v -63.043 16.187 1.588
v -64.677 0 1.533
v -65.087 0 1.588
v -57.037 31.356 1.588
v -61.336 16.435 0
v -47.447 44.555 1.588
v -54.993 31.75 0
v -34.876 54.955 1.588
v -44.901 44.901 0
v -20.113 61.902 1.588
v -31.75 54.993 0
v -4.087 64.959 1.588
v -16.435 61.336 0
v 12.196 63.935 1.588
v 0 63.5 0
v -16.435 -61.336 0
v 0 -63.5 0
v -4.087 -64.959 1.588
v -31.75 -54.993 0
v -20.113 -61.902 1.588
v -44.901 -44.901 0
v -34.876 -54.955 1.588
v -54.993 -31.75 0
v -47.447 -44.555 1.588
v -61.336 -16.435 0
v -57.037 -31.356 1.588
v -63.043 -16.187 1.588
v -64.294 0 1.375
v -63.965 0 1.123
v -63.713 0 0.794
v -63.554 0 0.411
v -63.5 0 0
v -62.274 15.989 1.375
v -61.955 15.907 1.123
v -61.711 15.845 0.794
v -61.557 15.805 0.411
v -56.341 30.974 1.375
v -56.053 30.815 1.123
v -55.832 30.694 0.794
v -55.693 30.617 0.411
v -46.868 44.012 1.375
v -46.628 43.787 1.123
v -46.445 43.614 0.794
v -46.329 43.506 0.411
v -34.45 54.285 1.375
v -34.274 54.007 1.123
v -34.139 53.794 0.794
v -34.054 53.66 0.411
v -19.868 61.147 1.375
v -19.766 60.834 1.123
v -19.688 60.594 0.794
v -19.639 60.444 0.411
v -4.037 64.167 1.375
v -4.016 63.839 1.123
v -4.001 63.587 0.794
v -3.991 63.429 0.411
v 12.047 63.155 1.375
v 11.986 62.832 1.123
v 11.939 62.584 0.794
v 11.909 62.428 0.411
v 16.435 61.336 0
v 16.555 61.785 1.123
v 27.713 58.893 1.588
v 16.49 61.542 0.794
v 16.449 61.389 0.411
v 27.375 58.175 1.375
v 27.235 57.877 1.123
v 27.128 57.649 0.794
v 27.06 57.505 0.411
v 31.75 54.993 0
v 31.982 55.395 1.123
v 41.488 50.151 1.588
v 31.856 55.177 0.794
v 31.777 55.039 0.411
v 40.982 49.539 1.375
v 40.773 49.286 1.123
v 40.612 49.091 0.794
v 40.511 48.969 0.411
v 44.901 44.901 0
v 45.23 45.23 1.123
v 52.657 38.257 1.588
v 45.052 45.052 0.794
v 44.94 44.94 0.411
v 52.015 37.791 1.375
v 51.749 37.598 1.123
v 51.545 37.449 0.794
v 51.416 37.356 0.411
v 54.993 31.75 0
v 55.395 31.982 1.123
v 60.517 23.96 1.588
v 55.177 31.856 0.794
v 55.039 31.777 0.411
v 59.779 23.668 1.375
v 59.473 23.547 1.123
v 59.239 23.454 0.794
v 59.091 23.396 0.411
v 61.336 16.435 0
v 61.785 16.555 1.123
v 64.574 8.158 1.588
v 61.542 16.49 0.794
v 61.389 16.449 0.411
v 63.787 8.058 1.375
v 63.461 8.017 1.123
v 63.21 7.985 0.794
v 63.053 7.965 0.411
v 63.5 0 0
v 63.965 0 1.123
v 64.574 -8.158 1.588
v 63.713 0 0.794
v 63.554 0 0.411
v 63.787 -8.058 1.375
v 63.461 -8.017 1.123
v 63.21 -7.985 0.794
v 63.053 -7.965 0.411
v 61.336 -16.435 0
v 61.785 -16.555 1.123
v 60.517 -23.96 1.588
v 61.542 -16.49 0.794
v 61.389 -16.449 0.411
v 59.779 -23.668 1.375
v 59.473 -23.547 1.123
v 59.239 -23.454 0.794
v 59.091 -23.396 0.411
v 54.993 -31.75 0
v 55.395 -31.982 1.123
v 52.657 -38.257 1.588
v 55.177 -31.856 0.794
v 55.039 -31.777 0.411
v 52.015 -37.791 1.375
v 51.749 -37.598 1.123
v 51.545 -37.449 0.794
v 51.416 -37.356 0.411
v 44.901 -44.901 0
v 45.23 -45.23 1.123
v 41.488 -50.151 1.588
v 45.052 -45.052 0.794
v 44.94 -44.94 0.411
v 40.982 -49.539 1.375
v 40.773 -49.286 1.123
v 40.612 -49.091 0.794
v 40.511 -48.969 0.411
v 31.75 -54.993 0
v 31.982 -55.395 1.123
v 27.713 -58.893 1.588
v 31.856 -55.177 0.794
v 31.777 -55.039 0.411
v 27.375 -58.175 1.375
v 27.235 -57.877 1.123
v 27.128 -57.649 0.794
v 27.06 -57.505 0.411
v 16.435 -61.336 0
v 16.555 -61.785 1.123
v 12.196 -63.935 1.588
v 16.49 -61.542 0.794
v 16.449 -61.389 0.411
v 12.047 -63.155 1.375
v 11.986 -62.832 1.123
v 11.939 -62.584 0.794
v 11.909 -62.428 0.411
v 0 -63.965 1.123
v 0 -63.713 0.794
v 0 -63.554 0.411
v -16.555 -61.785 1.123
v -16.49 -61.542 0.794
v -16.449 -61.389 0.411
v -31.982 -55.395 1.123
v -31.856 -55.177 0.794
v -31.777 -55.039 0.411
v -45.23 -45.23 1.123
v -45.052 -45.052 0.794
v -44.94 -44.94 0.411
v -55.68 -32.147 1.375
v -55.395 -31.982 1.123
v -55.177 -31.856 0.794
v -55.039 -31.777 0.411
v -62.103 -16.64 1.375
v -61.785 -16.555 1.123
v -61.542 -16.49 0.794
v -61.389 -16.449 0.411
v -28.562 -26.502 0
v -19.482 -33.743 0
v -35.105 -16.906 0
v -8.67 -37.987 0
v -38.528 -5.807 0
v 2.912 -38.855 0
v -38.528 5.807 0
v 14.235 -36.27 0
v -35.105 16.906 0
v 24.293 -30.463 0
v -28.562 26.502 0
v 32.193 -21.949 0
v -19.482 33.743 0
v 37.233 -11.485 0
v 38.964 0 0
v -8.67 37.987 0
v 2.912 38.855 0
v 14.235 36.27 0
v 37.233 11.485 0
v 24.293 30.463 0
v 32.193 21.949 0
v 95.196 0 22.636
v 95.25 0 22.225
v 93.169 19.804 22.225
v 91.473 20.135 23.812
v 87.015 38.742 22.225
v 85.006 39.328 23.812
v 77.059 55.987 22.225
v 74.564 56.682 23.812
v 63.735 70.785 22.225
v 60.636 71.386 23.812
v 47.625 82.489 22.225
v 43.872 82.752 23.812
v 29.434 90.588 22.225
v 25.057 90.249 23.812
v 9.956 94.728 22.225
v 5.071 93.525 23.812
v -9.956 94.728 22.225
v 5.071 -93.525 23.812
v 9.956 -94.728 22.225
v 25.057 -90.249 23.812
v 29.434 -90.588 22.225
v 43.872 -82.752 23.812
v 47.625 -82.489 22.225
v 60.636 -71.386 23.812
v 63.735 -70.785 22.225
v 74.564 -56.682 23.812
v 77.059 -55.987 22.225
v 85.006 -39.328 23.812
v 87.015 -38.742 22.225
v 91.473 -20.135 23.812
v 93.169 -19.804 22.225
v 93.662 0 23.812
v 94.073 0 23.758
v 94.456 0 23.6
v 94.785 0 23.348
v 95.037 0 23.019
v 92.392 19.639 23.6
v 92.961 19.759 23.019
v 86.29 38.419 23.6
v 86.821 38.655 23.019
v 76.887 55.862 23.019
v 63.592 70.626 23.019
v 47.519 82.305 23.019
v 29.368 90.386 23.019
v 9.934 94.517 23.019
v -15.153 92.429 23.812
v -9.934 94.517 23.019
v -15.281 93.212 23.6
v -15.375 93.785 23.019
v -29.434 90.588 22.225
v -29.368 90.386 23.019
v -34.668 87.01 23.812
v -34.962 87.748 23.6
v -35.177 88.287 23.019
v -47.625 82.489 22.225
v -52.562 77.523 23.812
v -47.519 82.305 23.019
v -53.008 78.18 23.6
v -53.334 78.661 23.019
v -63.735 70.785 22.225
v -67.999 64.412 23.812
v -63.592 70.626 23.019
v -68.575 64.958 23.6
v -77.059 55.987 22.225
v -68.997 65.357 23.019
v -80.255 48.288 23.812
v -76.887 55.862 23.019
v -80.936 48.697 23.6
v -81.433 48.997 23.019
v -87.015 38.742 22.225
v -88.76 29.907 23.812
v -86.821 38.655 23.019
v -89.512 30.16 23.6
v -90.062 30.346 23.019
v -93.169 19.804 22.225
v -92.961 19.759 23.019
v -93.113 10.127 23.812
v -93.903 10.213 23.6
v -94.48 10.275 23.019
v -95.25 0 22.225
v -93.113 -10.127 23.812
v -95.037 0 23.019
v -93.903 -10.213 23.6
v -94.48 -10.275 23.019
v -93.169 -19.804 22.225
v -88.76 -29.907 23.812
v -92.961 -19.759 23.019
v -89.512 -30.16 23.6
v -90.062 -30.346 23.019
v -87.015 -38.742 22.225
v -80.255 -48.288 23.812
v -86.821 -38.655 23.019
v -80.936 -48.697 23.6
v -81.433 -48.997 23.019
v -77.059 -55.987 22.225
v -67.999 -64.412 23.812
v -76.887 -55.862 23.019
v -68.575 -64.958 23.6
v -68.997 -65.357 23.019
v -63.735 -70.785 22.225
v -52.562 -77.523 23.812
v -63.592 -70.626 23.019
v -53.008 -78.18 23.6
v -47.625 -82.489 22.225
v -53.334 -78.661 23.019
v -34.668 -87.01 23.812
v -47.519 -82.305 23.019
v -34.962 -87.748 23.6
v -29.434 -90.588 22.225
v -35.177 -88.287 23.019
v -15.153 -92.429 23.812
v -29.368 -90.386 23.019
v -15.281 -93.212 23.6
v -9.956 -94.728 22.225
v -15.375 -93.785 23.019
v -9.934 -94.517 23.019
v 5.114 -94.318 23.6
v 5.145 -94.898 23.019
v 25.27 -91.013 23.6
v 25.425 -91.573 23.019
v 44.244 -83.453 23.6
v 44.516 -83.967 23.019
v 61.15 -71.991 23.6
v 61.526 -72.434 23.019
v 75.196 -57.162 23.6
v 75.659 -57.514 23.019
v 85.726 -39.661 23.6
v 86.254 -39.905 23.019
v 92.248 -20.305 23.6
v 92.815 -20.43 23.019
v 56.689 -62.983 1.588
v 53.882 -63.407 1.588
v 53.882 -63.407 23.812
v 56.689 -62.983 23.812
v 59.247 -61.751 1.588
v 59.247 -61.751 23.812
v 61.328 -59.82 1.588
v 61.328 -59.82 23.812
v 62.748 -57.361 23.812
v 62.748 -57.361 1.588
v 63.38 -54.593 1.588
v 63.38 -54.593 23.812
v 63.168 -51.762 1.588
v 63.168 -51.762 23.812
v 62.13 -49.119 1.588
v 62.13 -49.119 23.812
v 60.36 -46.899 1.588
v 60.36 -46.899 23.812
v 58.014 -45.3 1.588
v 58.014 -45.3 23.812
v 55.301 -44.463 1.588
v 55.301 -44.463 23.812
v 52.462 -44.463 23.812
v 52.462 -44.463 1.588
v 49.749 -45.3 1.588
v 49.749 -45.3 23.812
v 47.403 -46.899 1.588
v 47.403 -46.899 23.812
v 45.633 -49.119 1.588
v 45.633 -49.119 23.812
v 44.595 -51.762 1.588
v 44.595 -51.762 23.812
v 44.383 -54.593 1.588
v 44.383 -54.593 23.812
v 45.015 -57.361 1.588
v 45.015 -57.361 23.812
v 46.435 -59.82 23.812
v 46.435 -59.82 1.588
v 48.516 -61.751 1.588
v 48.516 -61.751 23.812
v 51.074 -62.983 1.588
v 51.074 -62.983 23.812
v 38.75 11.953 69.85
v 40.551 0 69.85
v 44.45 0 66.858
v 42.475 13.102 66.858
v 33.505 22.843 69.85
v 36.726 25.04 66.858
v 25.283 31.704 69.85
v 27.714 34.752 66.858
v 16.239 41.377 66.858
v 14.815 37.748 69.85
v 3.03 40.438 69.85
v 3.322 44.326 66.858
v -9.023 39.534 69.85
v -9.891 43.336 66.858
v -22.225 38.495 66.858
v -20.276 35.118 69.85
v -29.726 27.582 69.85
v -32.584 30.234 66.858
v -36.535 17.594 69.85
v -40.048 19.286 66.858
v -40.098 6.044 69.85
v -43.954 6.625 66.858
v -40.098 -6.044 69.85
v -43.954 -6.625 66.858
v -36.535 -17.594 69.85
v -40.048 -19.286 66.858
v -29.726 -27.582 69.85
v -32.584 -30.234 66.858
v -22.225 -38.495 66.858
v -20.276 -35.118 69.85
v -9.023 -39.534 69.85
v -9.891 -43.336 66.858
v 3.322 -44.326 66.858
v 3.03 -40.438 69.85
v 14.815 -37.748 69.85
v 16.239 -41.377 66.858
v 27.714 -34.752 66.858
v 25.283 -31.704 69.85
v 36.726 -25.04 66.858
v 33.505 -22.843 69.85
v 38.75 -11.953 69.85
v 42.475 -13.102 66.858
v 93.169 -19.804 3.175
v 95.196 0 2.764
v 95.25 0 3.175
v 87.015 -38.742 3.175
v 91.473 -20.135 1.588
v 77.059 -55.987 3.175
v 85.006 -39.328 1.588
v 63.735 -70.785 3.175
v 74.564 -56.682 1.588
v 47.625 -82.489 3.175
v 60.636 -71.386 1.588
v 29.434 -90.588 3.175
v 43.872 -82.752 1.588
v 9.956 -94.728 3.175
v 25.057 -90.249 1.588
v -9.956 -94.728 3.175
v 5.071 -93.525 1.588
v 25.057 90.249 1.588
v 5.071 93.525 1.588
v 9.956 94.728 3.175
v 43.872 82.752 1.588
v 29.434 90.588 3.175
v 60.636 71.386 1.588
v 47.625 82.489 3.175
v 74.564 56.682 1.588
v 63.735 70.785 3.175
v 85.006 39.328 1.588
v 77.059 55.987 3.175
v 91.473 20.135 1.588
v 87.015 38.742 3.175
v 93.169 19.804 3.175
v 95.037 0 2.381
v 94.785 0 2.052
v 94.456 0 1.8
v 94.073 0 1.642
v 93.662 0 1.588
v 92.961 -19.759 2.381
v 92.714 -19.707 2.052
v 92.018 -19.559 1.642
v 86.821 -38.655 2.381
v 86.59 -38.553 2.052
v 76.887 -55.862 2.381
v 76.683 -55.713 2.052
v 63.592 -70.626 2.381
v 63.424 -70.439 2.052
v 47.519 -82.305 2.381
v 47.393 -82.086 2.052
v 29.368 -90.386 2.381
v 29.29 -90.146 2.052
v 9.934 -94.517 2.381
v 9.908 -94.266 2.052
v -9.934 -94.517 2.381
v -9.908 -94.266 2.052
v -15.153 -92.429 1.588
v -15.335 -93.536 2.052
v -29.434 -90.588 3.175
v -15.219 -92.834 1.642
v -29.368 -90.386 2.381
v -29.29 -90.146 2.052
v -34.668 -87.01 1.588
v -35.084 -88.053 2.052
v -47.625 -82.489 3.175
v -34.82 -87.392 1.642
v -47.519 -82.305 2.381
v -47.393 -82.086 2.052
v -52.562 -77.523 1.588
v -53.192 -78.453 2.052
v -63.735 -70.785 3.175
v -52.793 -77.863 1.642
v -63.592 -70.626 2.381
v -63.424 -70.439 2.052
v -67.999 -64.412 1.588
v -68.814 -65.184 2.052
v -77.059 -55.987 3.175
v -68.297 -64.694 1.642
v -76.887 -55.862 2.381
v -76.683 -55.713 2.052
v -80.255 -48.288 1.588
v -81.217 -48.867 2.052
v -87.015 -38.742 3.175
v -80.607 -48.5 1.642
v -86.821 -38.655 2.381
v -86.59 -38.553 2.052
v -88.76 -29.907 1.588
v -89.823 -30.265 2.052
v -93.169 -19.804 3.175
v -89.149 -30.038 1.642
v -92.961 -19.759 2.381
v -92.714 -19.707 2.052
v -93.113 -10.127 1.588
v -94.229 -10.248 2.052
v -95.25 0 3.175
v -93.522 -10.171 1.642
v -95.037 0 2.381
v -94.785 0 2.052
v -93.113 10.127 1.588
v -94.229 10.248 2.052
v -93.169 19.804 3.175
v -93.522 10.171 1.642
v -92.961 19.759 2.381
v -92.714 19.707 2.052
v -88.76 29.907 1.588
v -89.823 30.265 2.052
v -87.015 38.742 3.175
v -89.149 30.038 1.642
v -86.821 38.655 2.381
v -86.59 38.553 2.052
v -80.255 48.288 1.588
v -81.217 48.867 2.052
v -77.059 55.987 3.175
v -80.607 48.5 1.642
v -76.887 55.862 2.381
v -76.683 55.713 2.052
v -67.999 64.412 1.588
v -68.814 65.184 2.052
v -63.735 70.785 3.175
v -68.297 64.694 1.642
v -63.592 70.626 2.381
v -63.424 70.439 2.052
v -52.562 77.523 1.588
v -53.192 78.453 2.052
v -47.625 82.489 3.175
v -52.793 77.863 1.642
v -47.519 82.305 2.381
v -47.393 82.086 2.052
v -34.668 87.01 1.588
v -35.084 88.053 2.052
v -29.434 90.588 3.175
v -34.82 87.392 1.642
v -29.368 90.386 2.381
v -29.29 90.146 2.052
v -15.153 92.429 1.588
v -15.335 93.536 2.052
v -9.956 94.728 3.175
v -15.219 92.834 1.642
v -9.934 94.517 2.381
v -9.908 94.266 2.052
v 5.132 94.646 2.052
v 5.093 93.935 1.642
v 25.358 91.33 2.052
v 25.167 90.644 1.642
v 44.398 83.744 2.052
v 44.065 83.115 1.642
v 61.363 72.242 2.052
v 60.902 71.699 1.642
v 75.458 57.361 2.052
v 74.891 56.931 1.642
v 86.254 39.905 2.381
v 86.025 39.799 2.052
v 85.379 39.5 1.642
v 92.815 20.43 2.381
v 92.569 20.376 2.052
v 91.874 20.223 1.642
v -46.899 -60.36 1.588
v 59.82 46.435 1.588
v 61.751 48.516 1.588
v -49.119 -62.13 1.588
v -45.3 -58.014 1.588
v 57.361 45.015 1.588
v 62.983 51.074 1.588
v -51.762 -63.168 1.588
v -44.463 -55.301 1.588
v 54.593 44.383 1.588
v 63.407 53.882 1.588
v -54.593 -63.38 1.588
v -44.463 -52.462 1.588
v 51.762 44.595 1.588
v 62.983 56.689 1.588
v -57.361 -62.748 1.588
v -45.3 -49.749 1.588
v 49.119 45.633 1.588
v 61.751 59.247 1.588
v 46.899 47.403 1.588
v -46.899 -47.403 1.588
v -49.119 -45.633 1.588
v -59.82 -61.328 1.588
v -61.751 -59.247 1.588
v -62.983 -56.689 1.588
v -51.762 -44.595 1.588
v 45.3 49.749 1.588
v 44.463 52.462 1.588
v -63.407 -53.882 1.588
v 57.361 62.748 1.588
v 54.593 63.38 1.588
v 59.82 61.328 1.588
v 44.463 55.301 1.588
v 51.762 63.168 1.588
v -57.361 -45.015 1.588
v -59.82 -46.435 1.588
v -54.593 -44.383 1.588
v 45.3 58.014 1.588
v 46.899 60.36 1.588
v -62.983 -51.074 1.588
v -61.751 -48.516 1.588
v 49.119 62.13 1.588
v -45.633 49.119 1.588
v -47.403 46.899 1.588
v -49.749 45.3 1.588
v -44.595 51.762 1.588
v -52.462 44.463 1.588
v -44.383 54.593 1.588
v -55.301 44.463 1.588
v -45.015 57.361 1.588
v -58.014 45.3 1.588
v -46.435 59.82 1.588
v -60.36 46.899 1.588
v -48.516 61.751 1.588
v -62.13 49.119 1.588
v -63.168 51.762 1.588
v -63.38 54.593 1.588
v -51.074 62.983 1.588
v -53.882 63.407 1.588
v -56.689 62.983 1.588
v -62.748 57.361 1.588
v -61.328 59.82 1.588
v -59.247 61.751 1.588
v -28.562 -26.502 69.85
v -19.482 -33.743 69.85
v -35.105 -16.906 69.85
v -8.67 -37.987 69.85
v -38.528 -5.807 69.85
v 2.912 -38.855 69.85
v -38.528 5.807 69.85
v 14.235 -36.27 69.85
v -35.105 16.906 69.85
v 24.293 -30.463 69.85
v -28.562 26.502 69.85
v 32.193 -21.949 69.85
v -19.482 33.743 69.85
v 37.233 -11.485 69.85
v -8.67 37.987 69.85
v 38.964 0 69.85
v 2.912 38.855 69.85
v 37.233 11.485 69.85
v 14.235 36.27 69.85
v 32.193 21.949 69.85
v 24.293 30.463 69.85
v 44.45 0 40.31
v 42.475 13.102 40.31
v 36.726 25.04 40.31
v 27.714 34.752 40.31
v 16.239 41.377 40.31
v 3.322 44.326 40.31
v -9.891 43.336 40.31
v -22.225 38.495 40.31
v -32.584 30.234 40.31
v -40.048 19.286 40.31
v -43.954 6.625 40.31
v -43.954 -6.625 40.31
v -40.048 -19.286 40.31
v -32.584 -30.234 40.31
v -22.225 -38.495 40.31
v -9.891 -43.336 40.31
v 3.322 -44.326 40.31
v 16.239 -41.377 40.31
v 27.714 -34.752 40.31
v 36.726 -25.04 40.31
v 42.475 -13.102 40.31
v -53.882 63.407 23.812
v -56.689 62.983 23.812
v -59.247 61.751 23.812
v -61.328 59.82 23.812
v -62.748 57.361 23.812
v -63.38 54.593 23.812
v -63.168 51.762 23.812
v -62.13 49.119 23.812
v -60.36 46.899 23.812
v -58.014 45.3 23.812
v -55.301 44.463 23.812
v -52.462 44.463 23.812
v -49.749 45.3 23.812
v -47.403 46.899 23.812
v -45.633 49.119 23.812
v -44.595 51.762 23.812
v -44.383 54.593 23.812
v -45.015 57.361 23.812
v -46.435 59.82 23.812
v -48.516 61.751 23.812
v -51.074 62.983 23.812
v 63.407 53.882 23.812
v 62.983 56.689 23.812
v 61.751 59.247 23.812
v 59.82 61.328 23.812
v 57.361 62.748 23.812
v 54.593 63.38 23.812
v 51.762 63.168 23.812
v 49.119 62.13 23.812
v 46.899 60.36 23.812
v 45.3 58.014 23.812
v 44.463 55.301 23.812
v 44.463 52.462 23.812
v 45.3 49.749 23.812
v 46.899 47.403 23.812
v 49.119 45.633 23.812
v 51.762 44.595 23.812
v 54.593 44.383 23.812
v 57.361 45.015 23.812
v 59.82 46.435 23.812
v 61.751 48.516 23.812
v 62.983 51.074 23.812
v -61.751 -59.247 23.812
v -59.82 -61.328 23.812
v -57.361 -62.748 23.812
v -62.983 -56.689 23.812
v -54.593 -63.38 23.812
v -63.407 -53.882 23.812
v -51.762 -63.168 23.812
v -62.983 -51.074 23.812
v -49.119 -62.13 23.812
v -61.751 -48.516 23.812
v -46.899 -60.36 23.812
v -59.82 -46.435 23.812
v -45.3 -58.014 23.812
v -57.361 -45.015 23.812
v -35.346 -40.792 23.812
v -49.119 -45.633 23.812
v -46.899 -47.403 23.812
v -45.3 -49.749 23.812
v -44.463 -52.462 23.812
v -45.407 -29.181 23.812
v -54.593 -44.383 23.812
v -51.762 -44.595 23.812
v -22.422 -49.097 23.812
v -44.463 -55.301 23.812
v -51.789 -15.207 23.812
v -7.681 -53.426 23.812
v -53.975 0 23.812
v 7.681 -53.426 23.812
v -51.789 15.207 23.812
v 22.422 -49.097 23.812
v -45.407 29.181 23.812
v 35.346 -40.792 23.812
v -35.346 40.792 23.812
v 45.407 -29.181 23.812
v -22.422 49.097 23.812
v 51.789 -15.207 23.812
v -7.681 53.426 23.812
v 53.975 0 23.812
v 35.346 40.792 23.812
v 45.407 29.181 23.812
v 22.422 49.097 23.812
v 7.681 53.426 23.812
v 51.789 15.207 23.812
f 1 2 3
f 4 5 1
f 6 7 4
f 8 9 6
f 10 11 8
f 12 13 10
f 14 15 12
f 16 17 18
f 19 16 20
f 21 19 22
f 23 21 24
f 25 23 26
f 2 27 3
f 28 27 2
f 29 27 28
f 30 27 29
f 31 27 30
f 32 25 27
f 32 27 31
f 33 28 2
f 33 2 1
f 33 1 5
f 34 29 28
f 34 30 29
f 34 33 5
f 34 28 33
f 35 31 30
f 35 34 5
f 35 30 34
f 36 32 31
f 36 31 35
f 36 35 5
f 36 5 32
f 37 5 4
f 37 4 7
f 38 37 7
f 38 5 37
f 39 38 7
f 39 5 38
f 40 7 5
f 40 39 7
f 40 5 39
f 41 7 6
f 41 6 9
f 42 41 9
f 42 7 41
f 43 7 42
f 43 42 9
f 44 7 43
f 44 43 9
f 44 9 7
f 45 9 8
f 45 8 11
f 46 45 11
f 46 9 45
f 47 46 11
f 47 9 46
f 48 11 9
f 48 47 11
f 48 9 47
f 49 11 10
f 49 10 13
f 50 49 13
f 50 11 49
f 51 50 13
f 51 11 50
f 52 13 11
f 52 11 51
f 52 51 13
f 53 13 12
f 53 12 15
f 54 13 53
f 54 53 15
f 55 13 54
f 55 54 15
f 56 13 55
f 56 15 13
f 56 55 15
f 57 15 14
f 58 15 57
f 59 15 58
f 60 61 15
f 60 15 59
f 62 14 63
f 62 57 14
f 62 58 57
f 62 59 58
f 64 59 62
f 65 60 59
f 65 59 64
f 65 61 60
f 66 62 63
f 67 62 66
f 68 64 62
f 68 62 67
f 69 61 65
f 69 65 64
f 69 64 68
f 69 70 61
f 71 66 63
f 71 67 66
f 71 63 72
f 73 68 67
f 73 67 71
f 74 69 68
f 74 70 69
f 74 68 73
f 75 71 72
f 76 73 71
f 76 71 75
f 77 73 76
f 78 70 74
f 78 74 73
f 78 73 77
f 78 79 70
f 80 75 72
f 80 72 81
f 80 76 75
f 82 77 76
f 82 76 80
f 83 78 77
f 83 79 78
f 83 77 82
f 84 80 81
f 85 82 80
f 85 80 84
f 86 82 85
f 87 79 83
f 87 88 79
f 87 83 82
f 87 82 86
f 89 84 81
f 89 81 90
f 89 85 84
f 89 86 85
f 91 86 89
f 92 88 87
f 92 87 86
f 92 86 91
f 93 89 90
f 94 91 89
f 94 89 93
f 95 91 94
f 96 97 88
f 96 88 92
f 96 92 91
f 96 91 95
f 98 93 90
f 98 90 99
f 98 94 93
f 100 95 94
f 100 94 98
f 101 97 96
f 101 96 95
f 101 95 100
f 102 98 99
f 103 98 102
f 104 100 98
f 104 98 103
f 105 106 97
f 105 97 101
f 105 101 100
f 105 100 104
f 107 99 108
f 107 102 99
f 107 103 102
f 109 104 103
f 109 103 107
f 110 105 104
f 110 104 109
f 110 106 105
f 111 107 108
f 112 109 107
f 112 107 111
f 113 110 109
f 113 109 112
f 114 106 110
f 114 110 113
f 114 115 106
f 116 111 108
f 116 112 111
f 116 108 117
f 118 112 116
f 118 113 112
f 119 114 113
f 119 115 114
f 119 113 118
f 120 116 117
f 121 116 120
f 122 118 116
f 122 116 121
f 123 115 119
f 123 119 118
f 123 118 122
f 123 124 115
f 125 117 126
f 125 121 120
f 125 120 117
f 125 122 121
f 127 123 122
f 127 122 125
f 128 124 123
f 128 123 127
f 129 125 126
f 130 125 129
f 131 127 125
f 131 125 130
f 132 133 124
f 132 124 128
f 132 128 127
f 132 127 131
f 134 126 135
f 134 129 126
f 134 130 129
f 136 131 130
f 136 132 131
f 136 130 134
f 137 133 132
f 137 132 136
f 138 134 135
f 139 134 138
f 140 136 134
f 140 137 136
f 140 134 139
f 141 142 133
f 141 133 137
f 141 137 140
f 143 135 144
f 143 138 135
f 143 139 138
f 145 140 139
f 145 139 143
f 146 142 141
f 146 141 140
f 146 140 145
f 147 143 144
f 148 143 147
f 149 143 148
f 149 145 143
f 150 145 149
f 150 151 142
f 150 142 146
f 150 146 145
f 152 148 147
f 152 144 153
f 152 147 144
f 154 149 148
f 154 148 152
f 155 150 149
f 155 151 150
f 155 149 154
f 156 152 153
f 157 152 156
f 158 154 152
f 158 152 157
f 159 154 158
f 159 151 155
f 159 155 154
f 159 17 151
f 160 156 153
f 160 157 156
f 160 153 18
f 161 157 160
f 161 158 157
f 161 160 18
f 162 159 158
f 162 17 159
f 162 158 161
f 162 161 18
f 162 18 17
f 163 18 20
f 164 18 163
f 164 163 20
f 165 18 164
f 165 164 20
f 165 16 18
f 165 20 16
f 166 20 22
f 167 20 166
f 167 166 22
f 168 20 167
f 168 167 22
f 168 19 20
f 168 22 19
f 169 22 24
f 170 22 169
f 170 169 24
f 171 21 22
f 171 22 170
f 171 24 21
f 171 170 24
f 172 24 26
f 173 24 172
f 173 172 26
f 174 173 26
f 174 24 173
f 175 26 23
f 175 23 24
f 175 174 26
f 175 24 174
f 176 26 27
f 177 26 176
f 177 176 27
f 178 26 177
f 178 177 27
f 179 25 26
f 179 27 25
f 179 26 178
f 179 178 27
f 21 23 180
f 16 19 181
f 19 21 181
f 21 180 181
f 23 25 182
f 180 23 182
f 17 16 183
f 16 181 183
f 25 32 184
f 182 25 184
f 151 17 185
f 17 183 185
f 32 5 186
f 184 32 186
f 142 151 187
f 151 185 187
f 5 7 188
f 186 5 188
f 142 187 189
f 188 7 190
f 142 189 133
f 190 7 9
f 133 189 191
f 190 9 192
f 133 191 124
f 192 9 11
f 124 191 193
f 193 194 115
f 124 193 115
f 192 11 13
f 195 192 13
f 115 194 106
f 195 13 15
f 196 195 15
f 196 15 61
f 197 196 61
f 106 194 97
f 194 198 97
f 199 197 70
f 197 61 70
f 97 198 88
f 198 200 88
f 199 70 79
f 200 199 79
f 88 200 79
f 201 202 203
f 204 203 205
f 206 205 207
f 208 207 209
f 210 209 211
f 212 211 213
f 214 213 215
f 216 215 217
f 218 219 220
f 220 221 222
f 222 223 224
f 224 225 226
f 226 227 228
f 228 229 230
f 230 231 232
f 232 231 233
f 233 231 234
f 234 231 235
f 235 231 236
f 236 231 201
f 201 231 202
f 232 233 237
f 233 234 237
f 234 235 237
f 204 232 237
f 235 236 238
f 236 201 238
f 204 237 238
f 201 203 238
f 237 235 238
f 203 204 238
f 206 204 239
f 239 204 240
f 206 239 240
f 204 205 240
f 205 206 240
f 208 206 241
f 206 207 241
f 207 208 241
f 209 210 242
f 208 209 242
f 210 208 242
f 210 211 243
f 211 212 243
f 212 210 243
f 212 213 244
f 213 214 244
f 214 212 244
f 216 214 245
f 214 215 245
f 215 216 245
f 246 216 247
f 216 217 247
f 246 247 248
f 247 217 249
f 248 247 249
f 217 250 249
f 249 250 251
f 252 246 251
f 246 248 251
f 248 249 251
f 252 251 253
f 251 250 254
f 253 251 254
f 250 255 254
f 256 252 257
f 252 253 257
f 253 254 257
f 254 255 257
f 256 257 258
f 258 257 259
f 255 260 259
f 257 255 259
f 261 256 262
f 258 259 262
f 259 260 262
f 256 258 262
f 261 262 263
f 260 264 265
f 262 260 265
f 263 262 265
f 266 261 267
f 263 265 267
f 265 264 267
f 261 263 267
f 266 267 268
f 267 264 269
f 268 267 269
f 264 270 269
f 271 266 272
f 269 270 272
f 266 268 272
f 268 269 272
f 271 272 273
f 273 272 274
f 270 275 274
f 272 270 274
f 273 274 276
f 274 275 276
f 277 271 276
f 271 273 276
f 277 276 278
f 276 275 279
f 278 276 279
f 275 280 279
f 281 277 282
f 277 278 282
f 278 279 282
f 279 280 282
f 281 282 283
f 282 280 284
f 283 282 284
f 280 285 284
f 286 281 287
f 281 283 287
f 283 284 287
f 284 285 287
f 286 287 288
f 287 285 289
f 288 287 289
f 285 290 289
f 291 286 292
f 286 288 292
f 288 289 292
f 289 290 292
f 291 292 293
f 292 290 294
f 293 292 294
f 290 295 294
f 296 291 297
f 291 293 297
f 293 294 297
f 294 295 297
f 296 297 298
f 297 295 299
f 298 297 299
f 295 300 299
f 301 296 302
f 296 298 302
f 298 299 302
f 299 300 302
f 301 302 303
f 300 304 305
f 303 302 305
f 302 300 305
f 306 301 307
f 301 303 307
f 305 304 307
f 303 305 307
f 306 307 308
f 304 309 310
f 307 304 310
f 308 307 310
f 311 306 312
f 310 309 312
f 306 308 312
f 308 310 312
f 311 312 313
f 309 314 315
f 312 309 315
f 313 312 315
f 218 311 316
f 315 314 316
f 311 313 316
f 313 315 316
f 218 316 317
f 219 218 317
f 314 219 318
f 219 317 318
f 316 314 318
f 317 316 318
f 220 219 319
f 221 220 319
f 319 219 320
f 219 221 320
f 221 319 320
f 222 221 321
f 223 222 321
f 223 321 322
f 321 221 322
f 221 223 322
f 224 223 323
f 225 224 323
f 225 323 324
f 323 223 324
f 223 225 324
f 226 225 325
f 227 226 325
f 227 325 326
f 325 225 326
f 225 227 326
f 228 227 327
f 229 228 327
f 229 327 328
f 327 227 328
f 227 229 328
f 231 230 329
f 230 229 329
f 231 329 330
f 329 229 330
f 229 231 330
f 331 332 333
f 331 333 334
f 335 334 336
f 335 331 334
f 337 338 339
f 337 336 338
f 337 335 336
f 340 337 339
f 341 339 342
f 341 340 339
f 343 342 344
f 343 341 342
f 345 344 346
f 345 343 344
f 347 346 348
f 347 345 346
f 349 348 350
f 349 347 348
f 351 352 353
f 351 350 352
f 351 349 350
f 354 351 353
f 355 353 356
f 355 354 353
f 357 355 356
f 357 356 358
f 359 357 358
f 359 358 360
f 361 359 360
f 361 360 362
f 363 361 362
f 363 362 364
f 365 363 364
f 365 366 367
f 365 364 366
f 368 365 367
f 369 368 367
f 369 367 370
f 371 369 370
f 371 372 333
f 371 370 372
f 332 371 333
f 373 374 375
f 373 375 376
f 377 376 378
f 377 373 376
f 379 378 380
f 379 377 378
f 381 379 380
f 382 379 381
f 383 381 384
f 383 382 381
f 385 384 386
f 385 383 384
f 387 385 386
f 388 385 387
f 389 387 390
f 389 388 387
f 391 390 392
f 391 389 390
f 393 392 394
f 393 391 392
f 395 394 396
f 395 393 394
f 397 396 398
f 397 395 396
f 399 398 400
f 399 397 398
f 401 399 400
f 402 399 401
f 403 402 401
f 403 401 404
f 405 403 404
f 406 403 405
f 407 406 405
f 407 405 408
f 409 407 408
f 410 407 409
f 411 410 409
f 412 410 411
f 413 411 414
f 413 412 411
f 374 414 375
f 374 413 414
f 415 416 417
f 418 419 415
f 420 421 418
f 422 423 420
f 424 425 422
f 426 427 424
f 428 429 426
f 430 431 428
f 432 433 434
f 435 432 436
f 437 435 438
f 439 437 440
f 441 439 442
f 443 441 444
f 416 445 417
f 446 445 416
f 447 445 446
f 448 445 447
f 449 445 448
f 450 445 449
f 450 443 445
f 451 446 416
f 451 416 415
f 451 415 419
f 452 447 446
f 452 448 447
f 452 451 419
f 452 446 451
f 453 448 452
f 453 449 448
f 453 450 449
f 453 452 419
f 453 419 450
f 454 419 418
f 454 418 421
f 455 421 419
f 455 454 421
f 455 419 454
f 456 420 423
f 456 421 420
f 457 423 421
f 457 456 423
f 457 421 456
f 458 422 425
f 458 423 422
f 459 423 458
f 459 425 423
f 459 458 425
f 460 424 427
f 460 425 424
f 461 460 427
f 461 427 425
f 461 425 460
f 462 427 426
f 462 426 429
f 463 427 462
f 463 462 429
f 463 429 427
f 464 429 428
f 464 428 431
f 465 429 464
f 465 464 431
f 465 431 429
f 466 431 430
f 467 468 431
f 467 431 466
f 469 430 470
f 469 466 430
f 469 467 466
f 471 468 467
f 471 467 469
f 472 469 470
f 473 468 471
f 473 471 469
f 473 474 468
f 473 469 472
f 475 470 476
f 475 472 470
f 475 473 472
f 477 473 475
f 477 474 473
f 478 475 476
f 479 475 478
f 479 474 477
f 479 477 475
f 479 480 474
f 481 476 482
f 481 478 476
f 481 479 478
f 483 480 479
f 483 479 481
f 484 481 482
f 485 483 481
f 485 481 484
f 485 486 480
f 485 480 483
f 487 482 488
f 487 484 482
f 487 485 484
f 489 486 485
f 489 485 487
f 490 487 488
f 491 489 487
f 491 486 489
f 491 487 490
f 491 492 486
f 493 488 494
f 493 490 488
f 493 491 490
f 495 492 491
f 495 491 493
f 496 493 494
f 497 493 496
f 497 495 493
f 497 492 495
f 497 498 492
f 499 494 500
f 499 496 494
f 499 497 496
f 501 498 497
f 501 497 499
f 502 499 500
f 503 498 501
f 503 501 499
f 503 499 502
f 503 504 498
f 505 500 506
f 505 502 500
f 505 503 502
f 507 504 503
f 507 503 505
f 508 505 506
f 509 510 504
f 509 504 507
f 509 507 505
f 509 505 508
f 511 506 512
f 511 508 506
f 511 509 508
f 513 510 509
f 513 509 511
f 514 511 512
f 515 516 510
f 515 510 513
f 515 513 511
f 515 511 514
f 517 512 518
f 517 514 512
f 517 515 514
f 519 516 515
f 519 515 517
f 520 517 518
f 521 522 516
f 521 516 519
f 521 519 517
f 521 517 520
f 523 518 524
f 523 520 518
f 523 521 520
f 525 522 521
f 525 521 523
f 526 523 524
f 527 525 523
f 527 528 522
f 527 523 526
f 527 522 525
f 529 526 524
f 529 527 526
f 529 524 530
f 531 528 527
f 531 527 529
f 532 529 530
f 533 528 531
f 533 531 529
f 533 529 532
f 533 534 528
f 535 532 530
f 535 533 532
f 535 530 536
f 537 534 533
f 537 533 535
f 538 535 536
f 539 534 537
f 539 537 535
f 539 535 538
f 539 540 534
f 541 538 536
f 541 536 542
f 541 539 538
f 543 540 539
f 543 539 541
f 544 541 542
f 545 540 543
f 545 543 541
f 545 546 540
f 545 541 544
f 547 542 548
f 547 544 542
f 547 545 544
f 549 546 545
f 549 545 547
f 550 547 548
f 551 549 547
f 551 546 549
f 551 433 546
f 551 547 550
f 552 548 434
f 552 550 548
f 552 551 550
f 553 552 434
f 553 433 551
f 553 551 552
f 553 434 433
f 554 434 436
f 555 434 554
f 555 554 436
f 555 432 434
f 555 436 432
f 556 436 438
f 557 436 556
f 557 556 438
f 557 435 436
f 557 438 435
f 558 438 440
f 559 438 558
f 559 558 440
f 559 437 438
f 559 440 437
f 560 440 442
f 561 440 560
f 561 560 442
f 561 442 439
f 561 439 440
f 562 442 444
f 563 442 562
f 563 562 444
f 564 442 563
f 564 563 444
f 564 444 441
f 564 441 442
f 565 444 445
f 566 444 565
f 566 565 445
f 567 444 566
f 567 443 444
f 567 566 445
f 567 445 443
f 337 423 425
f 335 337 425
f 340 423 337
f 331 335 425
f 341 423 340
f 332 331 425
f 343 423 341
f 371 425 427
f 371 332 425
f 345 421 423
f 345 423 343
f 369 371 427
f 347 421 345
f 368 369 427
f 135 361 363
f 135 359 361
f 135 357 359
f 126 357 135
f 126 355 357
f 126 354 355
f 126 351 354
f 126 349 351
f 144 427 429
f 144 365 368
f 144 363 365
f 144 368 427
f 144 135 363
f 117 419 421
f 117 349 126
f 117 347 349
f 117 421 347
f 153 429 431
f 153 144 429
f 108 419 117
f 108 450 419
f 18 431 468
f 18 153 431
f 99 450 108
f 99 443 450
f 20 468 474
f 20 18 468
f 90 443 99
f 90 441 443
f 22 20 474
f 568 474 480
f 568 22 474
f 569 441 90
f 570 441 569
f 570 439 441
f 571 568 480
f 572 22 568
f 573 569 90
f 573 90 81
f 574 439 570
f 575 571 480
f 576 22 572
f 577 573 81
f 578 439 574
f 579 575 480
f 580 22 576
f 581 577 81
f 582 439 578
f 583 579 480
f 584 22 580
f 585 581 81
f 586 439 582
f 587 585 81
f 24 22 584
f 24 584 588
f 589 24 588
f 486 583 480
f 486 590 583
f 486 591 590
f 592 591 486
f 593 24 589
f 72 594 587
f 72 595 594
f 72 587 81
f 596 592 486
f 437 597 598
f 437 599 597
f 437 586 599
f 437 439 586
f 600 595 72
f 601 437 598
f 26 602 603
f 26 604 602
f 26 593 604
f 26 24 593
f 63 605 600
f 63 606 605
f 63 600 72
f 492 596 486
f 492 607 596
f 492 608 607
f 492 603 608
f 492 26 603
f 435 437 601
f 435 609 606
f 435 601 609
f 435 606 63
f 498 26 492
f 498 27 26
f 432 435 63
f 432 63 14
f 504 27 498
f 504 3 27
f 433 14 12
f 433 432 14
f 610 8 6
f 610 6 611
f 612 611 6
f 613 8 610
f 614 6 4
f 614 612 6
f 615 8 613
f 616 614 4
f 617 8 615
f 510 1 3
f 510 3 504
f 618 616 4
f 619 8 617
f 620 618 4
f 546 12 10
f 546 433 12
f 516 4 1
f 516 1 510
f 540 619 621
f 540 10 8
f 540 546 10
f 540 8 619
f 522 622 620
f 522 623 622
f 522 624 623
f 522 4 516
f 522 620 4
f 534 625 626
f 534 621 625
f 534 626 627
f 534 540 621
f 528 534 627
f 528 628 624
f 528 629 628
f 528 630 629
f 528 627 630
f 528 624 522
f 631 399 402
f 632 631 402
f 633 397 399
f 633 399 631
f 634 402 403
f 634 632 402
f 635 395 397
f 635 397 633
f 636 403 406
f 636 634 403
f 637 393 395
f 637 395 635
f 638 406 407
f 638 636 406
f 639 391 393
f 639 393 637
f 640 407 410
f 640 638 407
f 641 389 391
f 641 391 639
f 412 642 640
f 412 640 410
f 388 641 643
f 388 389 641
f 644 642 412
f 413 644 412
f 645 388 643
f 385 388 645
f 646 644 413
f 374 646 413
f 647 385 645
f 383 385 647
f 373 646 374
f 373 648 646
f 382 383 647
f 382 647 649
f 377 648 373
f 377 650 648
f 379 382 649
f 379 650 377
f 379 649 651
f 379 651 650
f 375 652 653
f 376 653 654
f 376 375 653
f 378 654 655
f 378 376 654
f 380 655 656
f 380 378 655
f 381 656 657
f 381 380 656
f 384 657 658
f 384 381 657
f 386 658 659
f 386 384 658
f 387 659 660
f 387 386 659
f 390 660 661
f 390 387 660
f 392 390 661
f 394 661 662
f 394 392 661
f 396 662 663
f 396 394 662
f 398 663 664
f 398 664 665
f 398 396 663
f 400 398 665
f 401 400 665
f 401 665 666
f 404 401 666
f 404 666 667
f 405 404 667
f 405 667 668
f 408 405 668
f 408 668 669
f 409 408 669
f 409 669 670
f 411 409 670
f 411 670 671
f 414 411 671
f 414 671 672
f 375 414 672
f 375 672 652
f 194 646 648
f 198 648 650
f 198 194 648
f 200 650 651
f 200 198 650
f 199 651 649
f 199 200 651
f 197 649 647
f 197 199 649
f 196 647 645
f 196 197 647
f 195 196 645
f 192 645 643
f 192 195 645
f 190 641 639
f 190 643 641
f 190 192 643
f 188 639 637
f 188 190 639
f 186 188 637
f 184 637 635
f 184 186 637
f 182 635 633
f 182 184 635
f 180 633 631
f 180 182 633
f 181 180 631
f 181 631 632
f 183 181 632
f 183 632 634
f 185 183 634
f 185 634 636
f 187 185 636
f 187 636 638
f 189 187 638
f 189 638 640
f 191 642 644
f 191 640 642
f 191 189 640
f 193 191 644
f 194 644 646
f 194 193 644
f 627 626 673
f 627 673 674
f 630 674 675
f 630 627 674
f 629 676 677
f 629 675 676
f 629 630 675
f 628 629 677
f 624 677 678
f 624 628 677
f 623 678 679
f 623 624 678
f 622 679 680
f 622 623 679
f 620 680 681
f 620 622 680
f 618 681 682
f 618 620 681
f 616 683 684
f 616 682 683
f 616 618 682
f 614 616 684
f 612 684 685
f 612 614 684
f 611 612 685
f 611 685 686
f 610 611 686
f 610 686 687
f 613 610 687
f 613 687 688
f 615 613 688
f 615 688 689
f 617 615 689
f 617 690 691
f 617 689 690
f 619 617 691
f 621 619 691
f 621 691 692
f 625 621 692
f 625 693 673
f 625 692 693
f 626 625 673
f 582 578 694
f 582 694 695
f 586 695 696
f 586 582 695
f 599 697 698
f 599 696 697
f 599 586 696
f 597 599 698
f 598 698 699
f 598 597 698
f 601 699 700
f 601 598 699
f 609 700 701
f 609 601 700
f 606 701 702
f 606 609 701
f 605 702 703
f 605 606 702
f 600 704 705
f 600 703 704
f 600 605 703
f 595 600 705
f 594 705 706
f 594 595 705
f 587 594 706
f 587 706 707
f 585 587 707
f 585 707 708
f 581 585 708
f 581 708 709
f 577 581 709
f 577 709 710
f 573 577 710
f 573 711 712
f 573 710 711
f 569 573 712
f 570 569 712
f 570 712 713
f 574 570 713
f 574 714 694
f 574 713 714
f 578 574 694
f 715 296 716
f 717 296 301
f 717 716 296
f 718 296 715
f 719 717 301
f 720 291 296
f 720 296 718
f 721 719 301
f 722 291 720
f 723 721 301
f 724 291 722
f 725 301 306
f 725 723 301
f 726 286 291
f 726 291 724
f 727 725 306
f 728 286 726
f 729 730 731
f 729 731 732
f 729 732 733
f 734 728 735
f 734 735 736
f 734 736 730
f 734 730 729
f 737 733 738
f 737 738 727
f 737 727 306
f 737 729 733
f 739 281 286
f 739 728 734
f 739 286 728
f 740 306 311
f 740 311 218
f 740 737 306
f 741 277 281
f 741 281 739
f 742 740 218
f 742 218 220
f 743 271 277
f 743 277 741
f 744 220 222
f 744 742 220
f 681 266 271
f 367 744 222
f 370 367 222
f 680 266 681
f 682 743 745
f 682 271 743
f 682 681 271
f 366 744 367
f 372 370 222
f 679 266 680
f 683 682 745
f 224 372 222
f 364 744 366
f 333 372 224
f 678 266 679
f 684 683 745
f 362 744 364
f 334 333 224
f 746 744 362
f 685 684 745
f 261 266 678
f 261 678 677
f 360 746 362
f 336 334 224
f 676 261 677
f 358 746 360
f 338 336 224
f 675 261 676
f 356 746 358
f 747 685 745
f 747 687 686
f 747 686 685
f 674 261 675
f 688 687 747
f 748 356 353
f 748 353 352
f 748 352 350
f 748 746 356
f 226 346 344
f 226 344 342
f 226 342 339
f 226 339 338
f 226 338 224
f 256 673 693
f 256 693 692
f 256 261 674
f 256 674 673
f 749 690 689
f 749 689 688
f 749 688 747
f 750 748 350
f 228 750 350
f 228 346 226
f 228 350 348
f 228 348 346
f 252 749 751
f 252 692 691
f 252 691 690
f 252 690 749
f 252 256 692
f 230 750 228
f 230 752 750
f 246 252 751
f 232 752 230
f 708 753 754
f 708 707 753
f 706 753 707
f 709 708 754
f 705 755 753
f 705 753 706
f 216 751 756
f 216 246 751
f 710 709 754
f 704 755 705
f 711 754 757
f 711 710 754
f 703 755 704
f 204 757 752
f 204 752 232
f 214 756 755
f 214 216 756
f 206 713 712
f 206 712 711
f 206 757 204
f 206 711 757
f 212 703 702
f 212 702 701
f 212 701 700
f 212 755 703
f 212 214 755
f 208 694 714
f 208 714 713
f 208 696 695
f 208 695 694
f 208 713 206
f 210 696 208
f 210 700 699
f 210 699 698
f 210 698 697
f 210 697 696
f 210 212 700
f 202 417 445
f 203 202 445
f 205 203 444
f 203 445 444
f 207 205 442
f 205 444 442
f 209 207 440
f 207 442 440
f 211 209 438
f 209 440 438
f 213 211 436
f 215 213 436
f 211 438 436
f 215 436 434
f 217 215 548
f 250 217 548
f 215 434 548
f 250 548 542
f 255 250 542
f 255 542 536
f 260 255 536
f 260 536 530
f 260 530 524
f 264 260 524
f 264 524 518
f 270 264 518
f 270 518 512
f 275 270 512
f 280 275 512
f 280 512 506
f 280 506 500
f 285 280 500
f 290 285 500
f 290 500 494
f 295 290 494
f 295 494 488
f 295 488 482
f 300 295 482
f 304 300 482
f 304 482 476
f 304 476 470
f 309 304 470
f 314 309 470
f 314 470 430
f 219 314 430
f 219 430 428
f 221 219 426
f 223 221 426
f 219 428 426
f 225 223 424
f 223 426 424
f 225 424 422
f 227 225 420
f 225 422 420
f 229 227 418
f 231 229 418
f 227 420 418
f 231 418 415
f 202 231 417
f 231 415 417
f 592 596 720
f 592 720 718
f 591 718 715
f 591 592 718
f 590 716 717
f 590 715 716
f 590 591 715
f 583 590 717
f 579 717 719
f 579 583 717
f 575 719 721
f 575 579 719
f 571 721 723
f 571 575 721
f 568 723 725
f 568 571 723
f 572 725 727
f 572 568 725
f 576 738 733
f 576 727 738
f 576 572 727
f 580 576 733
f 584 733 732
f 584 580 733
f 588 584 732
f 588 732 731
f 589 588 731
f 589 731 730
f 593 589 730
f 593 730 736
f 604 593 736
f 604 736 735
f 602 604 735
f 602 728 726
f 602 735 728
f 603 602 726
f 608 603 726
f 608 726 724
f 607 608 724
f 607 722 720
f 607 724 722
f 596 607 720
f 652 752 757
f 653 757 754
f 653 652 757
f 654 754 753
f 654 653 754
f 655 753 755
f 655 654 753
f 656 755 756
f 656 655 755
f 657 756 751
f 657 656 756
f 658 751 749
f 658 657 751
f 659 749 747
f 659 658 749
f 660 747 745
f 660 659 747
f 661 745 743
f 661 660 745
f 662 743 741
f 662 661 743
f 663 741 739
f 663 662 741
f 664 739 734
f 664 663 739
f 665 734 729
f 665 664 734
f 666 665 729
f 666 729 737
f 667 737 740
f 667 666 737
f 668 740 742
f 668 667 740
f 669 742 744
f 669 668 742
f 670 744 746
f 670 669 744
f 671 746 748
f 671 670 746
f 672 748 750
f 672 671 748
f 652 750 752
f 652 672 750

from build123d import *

# Parameters (mm, degrees)
SKETCH1_R                 = 95.25
BOSS_EXTRUDE1_DEPTH       = 23.8125
SKETCH2_R                 = 9.525
BOLTHOLE_DEPTH            = 137.792398021
BOLTHOLEPATTERN_COUNT     = 4
SKETCH5_OUTSIDE_W         = 246.592
SKETCH5_OUTSIDE_H         = 246.592
SKETCH5_OUTSIDE_R         = 63.5
RAISED_FACE_DEPTH         = 1.5875
SKETCH8_R                 = 53.975
WELD_NECK_120_DRAFT_DEPTH = 46.0375
WELD_NECK_120_DRAFT_TAPER = 30
WELD_NECK_END_REACH       = 153.737
SKETCH9_R                 = 44.45
WELD_NECK_CHAMFER1_SIZE   = 2.991731193
WELD_NECK_CHAMFER1_SIZE2  = 3.8989
SKETCH7_R                 = 38.9636
BORE_DEPTH                = 152.737099946
FILLET2_R                 = 1.5875
FILLET3_R                 = 1.5875


with BuildPart() as part:
    # Sketch1 → Boss-Extrude1 (new body)
    with BuildSketch(Plane.XY):
        Circle(SKETCH1_R)
    extrude(amount=BOSS_EXTRUDE1_DEPTH)

    # Sketch2 → BoltHole (cut, through all)
    with BuildSketch(Plane.XY):
        with Locations((53.881536726, 53.881536726)):
            Circle(SKETCH2_R)
    bolthole = extrude(amount=BOLTHOLE_DEPTH, mode=Mode.SUBTRACT)

    # BoltHolePattern: BoltHole ×4 about axis
    boltholepattern_axis = Axis((0, 0, 0), (0, 0, 1))
    for i in range(1, BOLTHOLEPATTERN_COUNT):
        add(bolthole.rotate(boltholepattern_axis, i * 360 / BOLTHOLEPATTERN_COUNT), mode=Mode.SUBTRACT)

    # Sketch5 outside → Raised Face (cut)
    with BuildSketch(Plane(origin=(0, 0, 0), x_dir=(-1, 0, 0), z_dir=(0, 0, -1))):
        Rectangle(SKETCH5_OUTSIDE_W, SKETCH5_OUTSIDE_H)
        Circle(SKETCH5_OUTSIDE_R, mode=Mode.SUBTRACT)
    extrude(amount=-RAISED_FACE_DEPTH, mode=Mode.SUBTRACT)

    # Sketch8 → Weld Neck 120 Draft (add)
    with BuildSketch(Plane.XY.offset(23.8125)):
        Circle(SKETCH8_R)
    extrude(amount=WELD_NECK_120_DRAFT_DEPTH, taper=WELD_NECK_120_DRAFT_TAPER)

    # Sketch9 → Weld Neck End (add, up to next)
    with BuildSketch(Plane.XY.offset(69.85), mode=Mode.PRIVATE) as weld_neck_end_sk1:
        Circle(SKETCH9_R)
    weld_neck_end_tool1 = extrude(weld_neck_end_sk1.sketch, amount=-WELD_NECK_END_REACH, mode=Mode.PRIVATE) - part.part
    add(weld_neck_end_tool1.solids().sort_by_distance((0, 0, 69.85))[0])

    # Weld Neck Chamfer1
    weld_neck_chamfer1_edges = [part.edges().sort_by_distance(p)[0] for p in [
        (-44.45, 0, 69.85),
    ]]
    weld_neck_chamfer1_side = [part.faces().sort_by_distance(p)[0] for p in [
        (-44.45, 0, 55.080141971),
    ]]
    chamfer(weld_neck_chamfer1_edges, length=WELD_NECK_CHAMFER1_SIZE, length2=WELD_NECK_CHAMFER1_SIZE2, reference=weld_neck_chamfer1_side[0])

    # Sketch7 → Bore (cut, through all)
    with BuildSketch(Plane.XY):
        Circle(SKETCH7_R)
    extrude(amount=BORE_DEPTH, mode=Mode.SUBTRACT)

    # Fillet2
    fillet2_edges = [part.edges().sort_by_distance(p)[0] for p in [
        (-95.25, 0, 1.5875),
        (-95.25, 0, 23.8125),
    ]]
    fillet(fillet2_edges, radius=FILLET2_R)

    # Fillet3
    fillet3_edges = [part.edges().sort_by_distance(p)[0] for p in [
        (63.5, 0, 1.5875),
    ]]
    fillet(fillet3_edges, radius=FILLET3_R - 0.0001)  # a hair under: the kernel refuses the full size


solid = part.part
